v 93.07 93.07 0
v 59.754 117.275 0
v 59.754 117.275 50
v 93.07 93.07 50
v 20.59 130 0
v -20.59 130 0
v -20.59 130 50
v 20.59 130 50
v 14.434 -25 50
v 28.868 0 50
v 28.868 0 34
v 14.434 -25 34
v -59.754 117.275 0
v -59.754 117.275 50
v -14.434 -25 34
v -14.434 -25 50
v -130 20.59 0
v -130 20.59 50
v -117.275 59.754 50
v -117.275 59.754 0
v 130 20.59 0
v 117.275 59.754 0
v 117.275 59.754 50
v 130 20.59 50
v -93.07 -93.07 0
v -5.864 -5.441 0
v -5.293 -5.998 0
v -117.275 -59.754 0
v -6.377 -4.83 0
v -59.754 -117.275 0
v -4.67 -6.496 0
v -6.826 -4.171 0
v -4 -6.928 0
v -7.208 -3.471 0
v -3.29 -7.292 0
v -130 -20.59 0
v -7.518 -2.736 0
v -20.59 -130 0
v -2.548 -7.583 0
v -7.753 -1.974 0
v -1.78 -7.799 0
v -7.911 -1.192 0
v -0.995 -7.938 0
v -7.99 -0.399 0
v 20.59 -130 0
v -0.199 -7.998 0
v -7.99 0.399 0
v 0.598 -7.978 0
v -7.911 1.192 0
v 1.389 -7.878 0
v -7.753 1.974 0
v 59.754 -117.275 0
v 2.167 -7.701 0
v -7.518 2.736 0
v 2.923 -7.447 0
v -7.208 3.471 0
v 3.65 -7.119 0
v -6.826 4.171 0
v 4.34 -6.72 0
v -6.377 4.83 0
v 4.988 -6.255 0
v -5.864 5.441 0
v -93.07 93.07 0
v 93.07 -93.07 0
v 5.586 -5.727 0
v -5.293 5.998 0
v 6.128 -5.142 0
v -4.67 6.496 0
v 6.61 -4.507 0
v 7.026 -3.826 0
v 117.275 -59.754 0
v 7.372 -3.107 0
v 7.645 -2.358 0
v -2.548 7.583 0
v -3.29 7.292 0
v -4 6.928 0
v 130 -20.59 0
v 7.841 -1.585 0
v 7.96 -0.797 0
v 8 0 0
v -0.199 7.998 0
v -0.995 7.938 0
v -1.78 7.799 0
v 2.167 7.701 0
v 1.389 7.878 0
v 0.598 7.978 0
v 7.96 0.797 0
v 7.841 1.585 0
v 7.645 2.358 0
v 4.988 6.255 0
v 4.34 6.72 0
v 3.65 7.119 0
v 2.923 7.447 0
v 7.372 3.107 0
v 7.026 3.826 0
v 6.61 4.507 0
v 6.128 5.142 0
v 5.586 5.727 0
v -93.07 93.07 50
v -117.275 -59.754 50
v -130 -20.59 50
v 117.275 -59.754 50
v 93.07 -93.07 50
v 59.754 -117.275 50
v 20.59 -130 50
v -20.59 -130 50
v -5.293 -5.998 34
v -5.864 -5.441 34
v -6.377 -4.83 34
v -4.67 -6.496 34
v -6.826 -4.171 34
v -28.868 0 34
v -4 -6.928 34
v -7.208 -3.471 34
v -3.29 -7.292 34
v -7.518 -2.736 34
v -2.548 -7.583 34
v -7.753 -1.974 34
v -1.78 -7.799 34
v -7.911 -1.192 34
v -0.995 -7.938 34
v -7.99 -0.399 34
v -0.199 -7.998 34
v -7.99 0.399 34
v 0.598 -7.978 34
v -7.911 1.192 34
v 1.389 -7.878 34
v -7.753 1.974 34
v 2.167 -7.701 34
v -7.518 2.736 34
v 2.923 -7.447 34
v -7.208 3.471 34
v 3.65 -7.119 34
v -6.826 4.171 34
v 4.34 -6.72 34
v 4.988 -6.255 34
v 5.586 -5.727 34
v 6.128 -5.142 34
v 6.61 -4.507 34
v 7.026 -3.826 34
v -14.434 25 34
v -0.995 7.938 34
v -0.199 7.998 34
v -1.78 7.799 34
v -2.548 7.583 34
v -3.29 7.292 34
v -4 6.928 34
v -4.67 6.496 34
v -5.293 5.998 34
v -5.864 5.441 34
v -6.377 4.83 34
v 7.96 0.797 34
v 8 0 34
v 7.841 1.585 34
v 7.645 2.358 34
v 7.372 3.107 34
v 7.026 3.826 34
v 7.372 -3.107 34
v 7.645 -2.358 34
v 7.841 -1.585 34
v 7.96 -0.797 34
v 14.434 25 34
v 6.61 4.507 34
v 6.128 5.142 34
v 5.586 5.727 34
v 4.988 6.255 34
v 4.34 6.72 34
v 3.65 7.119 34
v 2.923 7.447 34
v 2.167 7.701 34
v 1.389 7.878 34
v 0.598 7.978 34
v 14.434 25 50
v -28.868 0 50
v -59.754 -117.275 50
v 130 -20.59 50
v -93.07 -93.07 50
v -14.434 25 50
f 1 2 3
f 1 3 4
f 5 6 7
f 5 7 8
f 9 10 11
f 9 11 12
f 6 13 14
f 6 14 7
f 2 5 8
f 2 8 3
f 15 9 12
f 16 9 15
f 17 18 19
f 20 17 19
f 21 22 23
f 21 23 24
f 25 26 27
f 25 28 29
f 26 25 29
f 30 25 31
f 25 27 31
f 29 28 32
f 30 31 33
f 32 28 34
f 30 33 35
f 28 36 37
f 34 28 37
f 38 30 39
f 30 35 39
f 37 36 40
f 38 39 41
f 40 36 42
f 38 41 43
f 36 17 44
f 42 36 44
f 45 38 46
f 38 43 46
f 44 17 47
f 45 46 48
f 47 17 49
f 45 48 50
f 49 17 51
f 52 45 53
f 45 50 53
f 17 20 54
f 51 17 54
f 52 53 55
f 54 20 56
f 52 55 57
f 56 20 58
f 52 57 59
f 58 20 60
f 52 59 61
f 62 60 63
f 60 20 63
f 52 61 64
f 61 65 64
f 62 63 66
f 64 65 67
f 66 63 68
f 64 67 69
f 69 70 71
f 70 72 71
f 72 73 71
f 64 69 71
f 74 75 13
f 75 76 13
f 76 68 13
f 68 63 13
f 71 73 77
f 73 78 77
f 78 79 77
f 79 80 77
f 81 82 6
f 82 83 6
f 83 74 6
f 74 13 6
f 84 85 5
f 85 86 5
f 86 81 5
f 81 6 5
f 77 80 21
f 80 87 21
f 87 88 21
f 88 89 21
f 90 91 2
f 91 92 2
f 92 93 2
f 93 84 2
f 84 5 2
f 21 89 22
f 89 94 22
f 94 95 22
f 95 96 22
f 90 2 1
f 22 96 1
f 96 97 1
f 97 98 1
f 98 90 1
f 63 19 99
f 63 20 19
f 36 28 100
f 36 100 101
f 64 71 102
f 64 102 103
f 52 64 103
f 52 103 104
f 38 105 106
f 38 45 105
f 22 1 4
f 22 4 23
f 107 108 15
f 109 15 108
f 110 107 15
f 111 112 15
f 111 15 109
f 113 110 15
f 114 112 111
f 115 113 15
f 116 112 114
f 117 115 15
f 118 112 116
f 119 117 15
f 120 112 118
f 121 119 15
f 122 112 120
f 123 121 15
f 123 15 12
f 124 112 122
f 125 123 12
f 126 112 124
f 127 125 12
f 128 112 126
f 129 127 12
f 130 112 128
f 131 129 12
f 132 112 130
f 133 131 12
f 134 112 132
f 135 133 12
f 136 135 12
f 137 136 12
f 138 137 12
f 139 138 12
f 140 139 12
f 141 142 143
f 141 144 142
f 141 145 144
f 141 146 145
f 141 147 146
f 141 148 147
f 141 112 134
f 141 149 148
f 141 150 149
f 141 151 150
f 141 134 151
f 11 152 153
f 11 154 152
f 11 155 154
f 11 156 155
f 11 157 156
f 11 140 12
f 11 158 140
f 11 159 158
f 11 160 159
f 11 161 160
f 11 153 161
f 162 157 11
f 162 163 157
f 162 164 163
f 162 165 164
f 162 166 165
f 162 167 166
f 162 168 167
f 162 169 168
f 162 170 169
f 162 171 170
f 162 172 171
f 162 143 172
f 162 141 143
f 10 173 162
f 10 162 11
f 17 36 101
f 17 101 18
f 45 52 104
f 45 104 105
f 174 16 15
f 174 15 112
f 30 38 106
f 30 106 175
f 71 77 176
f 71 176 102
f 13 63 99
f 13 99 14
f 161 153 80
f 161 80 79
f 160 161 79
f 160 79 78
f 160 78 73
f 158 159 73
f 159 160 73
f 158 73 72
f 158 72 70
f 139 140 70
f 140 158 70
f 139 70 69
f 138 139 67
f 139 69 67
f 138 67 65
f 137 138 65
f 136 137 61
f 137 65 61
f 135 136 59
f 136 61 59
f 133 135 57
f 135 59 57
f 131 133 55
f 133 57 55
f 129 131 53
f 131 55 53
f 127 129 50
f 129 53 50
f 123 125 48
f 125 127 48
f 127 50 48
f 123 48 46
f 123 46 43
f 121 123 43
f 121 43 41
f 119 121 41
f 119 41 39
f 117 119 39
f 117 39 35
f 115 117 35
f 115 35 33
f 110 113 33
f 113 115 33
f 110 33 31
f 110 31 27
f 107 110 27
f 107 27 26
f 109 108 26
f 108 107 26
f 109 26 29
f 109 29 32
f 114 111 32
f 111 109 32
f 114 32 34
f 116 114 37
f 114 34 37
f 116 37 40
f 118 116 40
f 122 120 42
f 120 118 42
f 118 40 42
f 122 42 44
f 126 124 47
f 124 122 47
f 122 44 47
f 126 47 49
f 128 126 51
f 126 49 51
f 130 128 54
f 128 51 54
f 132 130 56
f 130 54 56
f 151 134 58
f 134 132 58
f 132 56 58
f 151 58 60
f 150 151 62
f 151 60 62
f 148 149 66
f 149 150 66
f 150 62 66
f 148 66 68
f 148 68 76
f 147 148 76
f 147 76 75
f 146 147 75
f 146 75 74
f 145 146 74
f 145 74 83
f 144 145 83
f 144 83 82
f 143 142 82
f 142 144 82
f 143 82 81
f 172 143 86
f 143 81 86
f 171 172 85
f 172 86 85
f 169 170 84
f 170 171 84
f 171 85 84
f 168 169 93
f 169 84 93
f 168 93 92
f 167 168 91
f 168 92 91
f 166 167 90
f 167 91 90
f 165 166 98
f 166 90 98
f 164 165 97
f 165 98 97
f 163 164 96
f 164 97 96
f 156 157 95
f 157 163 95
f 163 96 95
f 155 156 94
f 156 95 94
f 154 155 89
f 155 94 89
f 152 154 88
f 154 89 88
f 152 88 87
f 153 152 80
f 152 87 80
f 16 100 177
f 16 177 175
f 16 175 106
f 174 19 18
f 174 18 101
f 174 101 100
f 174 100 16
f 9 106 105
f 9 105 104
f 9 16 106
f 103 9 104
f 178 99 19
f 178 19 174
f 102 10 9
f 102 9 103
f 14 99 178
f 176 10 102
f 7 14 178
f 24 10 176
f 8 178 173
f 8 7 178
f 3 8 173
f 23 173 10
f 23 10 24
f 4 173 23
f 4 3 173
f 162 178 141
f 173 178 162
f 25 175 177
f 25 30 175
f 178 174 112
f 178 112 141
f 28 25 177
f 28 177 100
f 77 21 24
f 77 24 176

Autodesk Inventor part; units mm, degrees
ref_plane "YZ Plane" through (0, 0, 0) normal (1, 0, 0) x (0, 1, 0)
ref_plane "XZ Plane" through (0, 0, 0) normal (0, 1, 0) x (-1, 0, 0)
ref_plane "XY Plane" through (0, 0, 0) normal (0, 0, 1) x (1, 0, 0)
sketch "Sketch2" plane through (0, 0, 0) normal (0, 0, 1) x (1, 0, 0)
  line L0 (20.59, 130) -> (59.7544, 117.2747)
  line L1 (59.7544, 117.2747) -> (93.0697, 93.0697)
  line L2 (93.0697, 93.0697) -> (117.2747, 59.7544)
  line L3 (117.2747, 59.7544) -> (130, 20.59)
  line L4 (130, 20.59) -> (130, -20.59)
  line L5 (130, -20.59) -> (117.2747, -59.7544)
  line L6 (117.2747, -59.7544) -> (93.0697, -93.0697)
  line L7 (93.0697, -93.0697) -> (59.7544, -117.2747)
  line L8 (59.7544, -117.2747) -> (20.59, -130)
  line L9 (20.59, -130) -> (-20.59, -130)
  line L10 (-20.59, -130) -> (-59.7544, -117.2747)
  line L11 (-59.7544, -117.2747) -> (-93.0697, -93.0697)
  line L12 (-93.0697, -93.0697) -> (-117.2747, -59.7544)
  line L13 (-117.2747, -59.7544) -> (-130, -20.59)
  line L14 (-130, -20.59) -> (-130, 20.59)
  line L15 (-130, 20.59) -> (-117.2747, 59.7544)
  line L16 (-117.2747, 59.7544) -> (-93.0697, 93.0697)
  line L17 (-93.0697, 93.0697) -> (-59.7544, 117.2747)
  line L18 (-59.7544, 117.2747) -> (-20.59, 130)
  line L19 (-20.59, 130) -> (20.59, 130)
  circle A0 centre (0, 0) radius 8
  point P0 (0, 130)
  dimension "d0" = 260
  dimension "d3" = 16
extrude "Extrusion1" add sketch "Sketch2" along normal blind 50
sketch "Sketch3" plane through (0, 0, 50) normal (0, 0, 1) x (1, 0, 0)
  circle A0 centre (0, 0) radius 8 projected
  line L0 (14.4338, 25) -> (28.8675, 0)
  line L1 (28.8675, 0) -> (14.4338, -25)
  line L2 (14.4338, -25) -> (-14.4338, -25)
  line L3 (-14.4338, -25) -> (-28.8675, 0)
  line L4 (-28.8675, 0) -> (-14.4338, 25)
  line L5 (-14.4338, 25) -> (14.4338, 25)
  point P0 (0, 25)
  dimension "d4" = 50
extrude "Extrusion2" cut sketch "Sketch3" against normal blind 16
properties part number "PropellerHub"
